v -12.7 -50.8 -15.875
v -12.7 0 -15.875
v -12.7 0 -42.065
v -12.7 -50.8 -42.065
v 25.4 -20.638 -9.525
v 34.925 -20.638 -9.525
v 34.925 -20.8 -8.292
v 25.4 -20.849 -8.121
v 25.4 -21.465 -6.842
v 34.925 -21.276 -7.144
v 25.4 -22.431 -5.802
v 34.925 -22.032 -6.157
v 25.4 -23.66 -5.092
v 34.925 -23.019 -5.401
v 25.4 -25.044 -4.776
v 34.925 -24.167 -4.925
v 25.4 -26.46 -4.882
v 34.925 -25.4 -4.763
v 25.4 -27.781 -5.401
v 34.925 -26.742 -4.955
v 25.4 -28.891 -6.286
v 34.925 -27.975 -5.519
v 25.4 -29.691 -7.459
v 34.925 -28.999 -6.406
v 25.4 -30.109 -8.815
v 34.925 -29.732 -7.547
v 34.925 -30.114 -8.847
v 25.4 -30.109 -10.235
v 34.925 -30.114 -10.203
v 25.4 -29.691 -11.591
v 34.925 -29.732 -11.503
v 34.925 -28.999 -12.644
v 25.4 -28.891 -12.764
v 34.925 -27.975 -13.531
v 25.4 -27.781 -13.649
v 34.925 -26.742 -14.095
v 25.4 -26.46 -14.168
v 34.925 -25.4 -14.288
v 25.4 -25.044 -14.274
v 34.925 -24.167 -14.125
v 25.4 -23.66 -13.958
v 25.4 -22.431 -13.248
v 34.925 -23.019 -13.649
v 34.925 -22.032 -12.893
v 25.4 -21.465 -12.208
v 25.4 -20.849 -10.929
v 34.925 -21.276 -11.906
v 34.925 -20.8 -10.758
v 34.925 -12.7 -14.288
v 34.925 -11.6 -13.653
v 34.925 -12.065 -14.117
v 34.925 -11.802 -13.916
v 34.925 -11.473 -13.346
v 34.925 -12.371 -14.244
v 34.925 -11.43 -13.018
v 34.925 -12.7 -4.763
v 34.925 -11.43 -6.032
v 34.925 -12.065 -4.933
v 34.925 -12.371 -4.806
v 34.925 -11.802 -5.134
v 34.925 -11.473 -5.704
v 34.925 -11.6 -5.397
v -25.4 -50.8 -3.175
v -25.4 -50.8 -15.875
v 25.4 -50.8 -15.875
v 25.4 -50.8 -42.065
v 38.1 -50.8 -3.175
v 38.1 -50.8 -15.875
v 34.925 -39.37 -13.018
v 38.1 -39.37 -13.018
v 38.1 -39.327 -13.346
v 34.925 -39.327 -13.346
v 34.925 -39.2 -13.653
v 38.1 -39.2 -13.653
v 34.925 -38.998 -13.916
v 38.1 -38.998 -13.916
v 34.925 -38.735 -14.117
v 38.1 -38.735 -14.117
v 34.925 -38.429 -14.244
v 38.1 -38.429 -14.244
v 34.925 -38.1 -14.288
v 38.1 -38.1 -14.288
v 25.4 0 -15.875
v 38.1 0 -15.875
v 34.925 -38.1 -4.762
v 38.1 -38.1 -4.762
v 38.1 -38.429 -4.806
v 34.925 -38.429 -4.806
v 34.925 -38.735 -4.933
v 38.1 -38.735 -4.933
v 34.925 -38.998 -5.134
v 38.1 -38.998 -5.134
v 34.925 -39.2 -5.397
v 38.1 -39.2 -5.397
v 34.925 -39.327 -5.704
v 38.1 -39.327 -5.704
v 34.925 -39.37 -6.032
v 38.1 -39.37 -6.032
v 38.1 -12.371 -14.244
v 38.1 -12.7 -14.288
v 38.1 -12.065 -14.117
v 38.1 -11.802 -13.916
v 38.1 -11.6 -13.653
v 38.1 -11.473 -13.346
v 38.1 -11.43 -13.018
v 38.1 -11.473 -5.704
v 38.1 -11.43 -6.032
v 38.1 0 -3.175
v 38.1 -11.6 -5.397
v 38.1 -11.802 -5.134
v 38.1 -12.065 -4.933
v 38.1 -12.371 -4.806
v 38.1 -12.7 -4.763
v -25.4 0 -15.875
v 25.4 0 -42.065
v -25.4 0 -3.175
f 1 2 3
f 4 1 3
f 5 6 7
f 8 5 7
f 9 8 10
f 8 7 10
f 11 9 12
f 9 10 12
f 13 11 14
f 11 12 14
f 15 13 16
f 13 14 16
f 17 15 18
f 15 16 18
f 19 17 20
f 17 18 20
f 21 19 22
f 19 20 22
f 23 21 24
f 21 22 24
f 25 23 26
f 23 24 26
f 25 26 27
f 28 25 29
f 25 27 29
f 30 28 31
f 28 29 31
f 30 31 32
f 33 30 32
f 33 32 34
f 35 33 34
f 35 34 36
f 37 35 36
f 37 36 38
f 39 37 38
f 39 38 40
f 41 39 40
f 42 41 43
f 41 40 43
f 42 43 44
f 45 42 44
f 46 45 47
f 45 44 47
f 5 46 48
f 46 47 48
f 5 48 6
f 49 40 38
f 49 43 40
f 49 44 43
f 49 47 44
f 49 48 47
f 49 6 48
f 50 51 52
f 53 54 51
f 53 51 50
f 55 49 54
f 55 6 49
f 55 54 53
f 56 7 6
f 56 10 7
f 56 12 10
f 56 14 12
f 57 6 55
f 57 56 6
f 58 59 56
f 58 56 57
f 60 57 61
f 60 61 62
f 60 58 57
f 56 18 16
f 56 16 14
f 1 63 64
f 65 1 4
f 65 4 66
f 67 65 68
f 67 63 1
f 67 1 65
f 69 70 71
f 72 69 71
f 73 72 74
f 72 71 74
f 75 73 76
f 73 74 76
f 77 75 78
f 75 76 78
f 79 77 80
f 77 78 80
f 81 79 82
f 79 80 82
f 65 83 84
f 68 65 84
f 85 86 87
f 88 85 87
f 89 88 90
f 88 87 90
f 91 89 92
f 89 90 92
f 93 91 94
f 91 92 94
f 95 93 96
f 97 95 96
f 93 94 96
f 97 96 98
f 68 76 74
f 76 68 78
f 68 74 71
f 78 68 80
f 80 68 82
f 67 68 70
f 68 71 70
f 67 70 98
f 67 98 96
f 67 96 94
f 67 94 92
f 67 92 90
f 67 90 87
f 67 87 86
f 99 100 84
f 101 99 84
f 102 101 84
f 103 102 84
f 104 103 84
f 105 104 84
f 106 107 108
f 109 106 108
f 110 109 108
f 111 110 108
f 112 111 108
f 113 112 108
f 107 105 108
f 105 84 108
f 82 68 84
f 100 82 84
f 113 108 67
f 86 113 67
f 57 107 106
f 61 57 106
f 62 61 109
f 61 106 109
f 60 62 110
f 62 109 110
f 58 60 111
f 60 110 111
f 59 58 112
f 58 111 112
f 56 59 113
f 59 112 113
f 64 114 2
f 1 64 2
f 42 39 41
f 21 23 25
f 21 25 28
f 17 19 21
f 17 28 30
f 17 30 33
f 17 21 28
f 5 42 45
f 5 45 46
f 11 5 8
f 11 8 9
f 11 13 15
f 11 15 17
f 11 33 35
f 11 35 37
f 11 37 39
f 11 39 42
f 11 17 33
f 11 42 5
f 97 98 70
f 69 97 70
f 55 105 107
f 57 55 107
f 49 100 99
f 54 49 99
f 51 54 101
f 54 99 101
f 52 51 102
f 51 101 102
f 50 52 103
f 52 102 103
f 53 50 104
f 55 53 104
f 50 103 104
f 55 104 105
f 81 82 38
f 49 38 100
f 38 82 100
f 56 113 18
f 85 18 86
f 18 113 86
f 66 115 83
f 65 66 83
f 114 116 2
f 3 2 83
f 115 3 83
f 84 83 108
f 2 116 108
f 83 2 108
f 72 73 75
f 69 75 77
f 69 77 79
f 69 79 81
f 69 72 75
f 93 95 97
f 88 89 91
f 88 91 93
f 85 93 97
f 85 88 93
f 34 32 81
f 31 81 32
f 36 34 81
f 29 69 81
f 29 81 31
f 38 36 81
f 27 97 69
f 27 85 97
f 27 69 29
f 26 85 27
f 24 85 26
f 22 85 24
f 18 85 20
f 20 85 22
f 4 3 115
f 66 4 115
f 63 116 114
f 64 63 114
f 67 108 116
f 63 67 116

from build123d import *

# Parameters (mm, degrees)
F1_DEPTH = 50.8
F2_R     = 4.7625
F3_DEPTH = 12.7
F5_DEPTH = 3.175


with BuildPart() as f1:
    # F0 (on Front) → F1 (new body)
    with BuildSketch(Plane.XZ):
        Polygon((38.1, -15.875), (38.1, -3.175), (-25.4, -3.175), (-25.4, -15.875), (-12.7, -15.875), (-12.7, -22.225), (-12.7, -42.06454), (25.4, -42.06454), (25.4, -22.225), (25.4, -15.875), align=None)
    extrude(amount=F1_DEPTH)

    # F2 (on face) → F3 (cut)
    with BuildSketch(Plane.YZ.offset(38.1)):
        with Locations((-25.4, -9.525)):
            Circle(F2_R)
    extrude(amount=-F3_DEPTH, mode=Mode.SUBTRACT)

    # F4 (on face) → F5 (cut)
    with BuildSketch(Plane.YZ.offset(38.1)):
        with BuildLine():
            Line((-38.1, -14.2875), (-25.4, -14.2875))
            Line((-25.4, -14.2875), (-12.7, -14.2875))
            ThreePointArc((-12.7, -14.2875), (-11.801974, -13.915526), (-11.43, -13.0175))
            Line((-11.43, -13.0175), (-11.43, -9.8425))
            Line((-11.43, -9.8425), (-11.43, -6.0325))
            ThreePointArc((-11.43, -6.0325), (-11.801974, -5.134474), (-12.7, -4.7625))
            Line((-12.7, -4.7625), (-18.372404, -4.7625))
            Line((-18.372404, -4.7625), (-25.4, -4.7625))
            Line((-25.4, -4.7625), (-38.1, -4.7625))
            ThreePointArc((-38.1, -4.7625), (-38.998026, -5.134474), (-39.37, -6.0325))
            Line((-39.37, -6.0325), (-39.37, -13.0175))
            ThreePointArc((-39.37, -13.0175), (-38.998026, -13.915526), (-38.1, -14.2875))
        make_face()
    extrude(amount=-F5_DEPTH, mode=Mode.SUBTRACT)


solid = f1.part
